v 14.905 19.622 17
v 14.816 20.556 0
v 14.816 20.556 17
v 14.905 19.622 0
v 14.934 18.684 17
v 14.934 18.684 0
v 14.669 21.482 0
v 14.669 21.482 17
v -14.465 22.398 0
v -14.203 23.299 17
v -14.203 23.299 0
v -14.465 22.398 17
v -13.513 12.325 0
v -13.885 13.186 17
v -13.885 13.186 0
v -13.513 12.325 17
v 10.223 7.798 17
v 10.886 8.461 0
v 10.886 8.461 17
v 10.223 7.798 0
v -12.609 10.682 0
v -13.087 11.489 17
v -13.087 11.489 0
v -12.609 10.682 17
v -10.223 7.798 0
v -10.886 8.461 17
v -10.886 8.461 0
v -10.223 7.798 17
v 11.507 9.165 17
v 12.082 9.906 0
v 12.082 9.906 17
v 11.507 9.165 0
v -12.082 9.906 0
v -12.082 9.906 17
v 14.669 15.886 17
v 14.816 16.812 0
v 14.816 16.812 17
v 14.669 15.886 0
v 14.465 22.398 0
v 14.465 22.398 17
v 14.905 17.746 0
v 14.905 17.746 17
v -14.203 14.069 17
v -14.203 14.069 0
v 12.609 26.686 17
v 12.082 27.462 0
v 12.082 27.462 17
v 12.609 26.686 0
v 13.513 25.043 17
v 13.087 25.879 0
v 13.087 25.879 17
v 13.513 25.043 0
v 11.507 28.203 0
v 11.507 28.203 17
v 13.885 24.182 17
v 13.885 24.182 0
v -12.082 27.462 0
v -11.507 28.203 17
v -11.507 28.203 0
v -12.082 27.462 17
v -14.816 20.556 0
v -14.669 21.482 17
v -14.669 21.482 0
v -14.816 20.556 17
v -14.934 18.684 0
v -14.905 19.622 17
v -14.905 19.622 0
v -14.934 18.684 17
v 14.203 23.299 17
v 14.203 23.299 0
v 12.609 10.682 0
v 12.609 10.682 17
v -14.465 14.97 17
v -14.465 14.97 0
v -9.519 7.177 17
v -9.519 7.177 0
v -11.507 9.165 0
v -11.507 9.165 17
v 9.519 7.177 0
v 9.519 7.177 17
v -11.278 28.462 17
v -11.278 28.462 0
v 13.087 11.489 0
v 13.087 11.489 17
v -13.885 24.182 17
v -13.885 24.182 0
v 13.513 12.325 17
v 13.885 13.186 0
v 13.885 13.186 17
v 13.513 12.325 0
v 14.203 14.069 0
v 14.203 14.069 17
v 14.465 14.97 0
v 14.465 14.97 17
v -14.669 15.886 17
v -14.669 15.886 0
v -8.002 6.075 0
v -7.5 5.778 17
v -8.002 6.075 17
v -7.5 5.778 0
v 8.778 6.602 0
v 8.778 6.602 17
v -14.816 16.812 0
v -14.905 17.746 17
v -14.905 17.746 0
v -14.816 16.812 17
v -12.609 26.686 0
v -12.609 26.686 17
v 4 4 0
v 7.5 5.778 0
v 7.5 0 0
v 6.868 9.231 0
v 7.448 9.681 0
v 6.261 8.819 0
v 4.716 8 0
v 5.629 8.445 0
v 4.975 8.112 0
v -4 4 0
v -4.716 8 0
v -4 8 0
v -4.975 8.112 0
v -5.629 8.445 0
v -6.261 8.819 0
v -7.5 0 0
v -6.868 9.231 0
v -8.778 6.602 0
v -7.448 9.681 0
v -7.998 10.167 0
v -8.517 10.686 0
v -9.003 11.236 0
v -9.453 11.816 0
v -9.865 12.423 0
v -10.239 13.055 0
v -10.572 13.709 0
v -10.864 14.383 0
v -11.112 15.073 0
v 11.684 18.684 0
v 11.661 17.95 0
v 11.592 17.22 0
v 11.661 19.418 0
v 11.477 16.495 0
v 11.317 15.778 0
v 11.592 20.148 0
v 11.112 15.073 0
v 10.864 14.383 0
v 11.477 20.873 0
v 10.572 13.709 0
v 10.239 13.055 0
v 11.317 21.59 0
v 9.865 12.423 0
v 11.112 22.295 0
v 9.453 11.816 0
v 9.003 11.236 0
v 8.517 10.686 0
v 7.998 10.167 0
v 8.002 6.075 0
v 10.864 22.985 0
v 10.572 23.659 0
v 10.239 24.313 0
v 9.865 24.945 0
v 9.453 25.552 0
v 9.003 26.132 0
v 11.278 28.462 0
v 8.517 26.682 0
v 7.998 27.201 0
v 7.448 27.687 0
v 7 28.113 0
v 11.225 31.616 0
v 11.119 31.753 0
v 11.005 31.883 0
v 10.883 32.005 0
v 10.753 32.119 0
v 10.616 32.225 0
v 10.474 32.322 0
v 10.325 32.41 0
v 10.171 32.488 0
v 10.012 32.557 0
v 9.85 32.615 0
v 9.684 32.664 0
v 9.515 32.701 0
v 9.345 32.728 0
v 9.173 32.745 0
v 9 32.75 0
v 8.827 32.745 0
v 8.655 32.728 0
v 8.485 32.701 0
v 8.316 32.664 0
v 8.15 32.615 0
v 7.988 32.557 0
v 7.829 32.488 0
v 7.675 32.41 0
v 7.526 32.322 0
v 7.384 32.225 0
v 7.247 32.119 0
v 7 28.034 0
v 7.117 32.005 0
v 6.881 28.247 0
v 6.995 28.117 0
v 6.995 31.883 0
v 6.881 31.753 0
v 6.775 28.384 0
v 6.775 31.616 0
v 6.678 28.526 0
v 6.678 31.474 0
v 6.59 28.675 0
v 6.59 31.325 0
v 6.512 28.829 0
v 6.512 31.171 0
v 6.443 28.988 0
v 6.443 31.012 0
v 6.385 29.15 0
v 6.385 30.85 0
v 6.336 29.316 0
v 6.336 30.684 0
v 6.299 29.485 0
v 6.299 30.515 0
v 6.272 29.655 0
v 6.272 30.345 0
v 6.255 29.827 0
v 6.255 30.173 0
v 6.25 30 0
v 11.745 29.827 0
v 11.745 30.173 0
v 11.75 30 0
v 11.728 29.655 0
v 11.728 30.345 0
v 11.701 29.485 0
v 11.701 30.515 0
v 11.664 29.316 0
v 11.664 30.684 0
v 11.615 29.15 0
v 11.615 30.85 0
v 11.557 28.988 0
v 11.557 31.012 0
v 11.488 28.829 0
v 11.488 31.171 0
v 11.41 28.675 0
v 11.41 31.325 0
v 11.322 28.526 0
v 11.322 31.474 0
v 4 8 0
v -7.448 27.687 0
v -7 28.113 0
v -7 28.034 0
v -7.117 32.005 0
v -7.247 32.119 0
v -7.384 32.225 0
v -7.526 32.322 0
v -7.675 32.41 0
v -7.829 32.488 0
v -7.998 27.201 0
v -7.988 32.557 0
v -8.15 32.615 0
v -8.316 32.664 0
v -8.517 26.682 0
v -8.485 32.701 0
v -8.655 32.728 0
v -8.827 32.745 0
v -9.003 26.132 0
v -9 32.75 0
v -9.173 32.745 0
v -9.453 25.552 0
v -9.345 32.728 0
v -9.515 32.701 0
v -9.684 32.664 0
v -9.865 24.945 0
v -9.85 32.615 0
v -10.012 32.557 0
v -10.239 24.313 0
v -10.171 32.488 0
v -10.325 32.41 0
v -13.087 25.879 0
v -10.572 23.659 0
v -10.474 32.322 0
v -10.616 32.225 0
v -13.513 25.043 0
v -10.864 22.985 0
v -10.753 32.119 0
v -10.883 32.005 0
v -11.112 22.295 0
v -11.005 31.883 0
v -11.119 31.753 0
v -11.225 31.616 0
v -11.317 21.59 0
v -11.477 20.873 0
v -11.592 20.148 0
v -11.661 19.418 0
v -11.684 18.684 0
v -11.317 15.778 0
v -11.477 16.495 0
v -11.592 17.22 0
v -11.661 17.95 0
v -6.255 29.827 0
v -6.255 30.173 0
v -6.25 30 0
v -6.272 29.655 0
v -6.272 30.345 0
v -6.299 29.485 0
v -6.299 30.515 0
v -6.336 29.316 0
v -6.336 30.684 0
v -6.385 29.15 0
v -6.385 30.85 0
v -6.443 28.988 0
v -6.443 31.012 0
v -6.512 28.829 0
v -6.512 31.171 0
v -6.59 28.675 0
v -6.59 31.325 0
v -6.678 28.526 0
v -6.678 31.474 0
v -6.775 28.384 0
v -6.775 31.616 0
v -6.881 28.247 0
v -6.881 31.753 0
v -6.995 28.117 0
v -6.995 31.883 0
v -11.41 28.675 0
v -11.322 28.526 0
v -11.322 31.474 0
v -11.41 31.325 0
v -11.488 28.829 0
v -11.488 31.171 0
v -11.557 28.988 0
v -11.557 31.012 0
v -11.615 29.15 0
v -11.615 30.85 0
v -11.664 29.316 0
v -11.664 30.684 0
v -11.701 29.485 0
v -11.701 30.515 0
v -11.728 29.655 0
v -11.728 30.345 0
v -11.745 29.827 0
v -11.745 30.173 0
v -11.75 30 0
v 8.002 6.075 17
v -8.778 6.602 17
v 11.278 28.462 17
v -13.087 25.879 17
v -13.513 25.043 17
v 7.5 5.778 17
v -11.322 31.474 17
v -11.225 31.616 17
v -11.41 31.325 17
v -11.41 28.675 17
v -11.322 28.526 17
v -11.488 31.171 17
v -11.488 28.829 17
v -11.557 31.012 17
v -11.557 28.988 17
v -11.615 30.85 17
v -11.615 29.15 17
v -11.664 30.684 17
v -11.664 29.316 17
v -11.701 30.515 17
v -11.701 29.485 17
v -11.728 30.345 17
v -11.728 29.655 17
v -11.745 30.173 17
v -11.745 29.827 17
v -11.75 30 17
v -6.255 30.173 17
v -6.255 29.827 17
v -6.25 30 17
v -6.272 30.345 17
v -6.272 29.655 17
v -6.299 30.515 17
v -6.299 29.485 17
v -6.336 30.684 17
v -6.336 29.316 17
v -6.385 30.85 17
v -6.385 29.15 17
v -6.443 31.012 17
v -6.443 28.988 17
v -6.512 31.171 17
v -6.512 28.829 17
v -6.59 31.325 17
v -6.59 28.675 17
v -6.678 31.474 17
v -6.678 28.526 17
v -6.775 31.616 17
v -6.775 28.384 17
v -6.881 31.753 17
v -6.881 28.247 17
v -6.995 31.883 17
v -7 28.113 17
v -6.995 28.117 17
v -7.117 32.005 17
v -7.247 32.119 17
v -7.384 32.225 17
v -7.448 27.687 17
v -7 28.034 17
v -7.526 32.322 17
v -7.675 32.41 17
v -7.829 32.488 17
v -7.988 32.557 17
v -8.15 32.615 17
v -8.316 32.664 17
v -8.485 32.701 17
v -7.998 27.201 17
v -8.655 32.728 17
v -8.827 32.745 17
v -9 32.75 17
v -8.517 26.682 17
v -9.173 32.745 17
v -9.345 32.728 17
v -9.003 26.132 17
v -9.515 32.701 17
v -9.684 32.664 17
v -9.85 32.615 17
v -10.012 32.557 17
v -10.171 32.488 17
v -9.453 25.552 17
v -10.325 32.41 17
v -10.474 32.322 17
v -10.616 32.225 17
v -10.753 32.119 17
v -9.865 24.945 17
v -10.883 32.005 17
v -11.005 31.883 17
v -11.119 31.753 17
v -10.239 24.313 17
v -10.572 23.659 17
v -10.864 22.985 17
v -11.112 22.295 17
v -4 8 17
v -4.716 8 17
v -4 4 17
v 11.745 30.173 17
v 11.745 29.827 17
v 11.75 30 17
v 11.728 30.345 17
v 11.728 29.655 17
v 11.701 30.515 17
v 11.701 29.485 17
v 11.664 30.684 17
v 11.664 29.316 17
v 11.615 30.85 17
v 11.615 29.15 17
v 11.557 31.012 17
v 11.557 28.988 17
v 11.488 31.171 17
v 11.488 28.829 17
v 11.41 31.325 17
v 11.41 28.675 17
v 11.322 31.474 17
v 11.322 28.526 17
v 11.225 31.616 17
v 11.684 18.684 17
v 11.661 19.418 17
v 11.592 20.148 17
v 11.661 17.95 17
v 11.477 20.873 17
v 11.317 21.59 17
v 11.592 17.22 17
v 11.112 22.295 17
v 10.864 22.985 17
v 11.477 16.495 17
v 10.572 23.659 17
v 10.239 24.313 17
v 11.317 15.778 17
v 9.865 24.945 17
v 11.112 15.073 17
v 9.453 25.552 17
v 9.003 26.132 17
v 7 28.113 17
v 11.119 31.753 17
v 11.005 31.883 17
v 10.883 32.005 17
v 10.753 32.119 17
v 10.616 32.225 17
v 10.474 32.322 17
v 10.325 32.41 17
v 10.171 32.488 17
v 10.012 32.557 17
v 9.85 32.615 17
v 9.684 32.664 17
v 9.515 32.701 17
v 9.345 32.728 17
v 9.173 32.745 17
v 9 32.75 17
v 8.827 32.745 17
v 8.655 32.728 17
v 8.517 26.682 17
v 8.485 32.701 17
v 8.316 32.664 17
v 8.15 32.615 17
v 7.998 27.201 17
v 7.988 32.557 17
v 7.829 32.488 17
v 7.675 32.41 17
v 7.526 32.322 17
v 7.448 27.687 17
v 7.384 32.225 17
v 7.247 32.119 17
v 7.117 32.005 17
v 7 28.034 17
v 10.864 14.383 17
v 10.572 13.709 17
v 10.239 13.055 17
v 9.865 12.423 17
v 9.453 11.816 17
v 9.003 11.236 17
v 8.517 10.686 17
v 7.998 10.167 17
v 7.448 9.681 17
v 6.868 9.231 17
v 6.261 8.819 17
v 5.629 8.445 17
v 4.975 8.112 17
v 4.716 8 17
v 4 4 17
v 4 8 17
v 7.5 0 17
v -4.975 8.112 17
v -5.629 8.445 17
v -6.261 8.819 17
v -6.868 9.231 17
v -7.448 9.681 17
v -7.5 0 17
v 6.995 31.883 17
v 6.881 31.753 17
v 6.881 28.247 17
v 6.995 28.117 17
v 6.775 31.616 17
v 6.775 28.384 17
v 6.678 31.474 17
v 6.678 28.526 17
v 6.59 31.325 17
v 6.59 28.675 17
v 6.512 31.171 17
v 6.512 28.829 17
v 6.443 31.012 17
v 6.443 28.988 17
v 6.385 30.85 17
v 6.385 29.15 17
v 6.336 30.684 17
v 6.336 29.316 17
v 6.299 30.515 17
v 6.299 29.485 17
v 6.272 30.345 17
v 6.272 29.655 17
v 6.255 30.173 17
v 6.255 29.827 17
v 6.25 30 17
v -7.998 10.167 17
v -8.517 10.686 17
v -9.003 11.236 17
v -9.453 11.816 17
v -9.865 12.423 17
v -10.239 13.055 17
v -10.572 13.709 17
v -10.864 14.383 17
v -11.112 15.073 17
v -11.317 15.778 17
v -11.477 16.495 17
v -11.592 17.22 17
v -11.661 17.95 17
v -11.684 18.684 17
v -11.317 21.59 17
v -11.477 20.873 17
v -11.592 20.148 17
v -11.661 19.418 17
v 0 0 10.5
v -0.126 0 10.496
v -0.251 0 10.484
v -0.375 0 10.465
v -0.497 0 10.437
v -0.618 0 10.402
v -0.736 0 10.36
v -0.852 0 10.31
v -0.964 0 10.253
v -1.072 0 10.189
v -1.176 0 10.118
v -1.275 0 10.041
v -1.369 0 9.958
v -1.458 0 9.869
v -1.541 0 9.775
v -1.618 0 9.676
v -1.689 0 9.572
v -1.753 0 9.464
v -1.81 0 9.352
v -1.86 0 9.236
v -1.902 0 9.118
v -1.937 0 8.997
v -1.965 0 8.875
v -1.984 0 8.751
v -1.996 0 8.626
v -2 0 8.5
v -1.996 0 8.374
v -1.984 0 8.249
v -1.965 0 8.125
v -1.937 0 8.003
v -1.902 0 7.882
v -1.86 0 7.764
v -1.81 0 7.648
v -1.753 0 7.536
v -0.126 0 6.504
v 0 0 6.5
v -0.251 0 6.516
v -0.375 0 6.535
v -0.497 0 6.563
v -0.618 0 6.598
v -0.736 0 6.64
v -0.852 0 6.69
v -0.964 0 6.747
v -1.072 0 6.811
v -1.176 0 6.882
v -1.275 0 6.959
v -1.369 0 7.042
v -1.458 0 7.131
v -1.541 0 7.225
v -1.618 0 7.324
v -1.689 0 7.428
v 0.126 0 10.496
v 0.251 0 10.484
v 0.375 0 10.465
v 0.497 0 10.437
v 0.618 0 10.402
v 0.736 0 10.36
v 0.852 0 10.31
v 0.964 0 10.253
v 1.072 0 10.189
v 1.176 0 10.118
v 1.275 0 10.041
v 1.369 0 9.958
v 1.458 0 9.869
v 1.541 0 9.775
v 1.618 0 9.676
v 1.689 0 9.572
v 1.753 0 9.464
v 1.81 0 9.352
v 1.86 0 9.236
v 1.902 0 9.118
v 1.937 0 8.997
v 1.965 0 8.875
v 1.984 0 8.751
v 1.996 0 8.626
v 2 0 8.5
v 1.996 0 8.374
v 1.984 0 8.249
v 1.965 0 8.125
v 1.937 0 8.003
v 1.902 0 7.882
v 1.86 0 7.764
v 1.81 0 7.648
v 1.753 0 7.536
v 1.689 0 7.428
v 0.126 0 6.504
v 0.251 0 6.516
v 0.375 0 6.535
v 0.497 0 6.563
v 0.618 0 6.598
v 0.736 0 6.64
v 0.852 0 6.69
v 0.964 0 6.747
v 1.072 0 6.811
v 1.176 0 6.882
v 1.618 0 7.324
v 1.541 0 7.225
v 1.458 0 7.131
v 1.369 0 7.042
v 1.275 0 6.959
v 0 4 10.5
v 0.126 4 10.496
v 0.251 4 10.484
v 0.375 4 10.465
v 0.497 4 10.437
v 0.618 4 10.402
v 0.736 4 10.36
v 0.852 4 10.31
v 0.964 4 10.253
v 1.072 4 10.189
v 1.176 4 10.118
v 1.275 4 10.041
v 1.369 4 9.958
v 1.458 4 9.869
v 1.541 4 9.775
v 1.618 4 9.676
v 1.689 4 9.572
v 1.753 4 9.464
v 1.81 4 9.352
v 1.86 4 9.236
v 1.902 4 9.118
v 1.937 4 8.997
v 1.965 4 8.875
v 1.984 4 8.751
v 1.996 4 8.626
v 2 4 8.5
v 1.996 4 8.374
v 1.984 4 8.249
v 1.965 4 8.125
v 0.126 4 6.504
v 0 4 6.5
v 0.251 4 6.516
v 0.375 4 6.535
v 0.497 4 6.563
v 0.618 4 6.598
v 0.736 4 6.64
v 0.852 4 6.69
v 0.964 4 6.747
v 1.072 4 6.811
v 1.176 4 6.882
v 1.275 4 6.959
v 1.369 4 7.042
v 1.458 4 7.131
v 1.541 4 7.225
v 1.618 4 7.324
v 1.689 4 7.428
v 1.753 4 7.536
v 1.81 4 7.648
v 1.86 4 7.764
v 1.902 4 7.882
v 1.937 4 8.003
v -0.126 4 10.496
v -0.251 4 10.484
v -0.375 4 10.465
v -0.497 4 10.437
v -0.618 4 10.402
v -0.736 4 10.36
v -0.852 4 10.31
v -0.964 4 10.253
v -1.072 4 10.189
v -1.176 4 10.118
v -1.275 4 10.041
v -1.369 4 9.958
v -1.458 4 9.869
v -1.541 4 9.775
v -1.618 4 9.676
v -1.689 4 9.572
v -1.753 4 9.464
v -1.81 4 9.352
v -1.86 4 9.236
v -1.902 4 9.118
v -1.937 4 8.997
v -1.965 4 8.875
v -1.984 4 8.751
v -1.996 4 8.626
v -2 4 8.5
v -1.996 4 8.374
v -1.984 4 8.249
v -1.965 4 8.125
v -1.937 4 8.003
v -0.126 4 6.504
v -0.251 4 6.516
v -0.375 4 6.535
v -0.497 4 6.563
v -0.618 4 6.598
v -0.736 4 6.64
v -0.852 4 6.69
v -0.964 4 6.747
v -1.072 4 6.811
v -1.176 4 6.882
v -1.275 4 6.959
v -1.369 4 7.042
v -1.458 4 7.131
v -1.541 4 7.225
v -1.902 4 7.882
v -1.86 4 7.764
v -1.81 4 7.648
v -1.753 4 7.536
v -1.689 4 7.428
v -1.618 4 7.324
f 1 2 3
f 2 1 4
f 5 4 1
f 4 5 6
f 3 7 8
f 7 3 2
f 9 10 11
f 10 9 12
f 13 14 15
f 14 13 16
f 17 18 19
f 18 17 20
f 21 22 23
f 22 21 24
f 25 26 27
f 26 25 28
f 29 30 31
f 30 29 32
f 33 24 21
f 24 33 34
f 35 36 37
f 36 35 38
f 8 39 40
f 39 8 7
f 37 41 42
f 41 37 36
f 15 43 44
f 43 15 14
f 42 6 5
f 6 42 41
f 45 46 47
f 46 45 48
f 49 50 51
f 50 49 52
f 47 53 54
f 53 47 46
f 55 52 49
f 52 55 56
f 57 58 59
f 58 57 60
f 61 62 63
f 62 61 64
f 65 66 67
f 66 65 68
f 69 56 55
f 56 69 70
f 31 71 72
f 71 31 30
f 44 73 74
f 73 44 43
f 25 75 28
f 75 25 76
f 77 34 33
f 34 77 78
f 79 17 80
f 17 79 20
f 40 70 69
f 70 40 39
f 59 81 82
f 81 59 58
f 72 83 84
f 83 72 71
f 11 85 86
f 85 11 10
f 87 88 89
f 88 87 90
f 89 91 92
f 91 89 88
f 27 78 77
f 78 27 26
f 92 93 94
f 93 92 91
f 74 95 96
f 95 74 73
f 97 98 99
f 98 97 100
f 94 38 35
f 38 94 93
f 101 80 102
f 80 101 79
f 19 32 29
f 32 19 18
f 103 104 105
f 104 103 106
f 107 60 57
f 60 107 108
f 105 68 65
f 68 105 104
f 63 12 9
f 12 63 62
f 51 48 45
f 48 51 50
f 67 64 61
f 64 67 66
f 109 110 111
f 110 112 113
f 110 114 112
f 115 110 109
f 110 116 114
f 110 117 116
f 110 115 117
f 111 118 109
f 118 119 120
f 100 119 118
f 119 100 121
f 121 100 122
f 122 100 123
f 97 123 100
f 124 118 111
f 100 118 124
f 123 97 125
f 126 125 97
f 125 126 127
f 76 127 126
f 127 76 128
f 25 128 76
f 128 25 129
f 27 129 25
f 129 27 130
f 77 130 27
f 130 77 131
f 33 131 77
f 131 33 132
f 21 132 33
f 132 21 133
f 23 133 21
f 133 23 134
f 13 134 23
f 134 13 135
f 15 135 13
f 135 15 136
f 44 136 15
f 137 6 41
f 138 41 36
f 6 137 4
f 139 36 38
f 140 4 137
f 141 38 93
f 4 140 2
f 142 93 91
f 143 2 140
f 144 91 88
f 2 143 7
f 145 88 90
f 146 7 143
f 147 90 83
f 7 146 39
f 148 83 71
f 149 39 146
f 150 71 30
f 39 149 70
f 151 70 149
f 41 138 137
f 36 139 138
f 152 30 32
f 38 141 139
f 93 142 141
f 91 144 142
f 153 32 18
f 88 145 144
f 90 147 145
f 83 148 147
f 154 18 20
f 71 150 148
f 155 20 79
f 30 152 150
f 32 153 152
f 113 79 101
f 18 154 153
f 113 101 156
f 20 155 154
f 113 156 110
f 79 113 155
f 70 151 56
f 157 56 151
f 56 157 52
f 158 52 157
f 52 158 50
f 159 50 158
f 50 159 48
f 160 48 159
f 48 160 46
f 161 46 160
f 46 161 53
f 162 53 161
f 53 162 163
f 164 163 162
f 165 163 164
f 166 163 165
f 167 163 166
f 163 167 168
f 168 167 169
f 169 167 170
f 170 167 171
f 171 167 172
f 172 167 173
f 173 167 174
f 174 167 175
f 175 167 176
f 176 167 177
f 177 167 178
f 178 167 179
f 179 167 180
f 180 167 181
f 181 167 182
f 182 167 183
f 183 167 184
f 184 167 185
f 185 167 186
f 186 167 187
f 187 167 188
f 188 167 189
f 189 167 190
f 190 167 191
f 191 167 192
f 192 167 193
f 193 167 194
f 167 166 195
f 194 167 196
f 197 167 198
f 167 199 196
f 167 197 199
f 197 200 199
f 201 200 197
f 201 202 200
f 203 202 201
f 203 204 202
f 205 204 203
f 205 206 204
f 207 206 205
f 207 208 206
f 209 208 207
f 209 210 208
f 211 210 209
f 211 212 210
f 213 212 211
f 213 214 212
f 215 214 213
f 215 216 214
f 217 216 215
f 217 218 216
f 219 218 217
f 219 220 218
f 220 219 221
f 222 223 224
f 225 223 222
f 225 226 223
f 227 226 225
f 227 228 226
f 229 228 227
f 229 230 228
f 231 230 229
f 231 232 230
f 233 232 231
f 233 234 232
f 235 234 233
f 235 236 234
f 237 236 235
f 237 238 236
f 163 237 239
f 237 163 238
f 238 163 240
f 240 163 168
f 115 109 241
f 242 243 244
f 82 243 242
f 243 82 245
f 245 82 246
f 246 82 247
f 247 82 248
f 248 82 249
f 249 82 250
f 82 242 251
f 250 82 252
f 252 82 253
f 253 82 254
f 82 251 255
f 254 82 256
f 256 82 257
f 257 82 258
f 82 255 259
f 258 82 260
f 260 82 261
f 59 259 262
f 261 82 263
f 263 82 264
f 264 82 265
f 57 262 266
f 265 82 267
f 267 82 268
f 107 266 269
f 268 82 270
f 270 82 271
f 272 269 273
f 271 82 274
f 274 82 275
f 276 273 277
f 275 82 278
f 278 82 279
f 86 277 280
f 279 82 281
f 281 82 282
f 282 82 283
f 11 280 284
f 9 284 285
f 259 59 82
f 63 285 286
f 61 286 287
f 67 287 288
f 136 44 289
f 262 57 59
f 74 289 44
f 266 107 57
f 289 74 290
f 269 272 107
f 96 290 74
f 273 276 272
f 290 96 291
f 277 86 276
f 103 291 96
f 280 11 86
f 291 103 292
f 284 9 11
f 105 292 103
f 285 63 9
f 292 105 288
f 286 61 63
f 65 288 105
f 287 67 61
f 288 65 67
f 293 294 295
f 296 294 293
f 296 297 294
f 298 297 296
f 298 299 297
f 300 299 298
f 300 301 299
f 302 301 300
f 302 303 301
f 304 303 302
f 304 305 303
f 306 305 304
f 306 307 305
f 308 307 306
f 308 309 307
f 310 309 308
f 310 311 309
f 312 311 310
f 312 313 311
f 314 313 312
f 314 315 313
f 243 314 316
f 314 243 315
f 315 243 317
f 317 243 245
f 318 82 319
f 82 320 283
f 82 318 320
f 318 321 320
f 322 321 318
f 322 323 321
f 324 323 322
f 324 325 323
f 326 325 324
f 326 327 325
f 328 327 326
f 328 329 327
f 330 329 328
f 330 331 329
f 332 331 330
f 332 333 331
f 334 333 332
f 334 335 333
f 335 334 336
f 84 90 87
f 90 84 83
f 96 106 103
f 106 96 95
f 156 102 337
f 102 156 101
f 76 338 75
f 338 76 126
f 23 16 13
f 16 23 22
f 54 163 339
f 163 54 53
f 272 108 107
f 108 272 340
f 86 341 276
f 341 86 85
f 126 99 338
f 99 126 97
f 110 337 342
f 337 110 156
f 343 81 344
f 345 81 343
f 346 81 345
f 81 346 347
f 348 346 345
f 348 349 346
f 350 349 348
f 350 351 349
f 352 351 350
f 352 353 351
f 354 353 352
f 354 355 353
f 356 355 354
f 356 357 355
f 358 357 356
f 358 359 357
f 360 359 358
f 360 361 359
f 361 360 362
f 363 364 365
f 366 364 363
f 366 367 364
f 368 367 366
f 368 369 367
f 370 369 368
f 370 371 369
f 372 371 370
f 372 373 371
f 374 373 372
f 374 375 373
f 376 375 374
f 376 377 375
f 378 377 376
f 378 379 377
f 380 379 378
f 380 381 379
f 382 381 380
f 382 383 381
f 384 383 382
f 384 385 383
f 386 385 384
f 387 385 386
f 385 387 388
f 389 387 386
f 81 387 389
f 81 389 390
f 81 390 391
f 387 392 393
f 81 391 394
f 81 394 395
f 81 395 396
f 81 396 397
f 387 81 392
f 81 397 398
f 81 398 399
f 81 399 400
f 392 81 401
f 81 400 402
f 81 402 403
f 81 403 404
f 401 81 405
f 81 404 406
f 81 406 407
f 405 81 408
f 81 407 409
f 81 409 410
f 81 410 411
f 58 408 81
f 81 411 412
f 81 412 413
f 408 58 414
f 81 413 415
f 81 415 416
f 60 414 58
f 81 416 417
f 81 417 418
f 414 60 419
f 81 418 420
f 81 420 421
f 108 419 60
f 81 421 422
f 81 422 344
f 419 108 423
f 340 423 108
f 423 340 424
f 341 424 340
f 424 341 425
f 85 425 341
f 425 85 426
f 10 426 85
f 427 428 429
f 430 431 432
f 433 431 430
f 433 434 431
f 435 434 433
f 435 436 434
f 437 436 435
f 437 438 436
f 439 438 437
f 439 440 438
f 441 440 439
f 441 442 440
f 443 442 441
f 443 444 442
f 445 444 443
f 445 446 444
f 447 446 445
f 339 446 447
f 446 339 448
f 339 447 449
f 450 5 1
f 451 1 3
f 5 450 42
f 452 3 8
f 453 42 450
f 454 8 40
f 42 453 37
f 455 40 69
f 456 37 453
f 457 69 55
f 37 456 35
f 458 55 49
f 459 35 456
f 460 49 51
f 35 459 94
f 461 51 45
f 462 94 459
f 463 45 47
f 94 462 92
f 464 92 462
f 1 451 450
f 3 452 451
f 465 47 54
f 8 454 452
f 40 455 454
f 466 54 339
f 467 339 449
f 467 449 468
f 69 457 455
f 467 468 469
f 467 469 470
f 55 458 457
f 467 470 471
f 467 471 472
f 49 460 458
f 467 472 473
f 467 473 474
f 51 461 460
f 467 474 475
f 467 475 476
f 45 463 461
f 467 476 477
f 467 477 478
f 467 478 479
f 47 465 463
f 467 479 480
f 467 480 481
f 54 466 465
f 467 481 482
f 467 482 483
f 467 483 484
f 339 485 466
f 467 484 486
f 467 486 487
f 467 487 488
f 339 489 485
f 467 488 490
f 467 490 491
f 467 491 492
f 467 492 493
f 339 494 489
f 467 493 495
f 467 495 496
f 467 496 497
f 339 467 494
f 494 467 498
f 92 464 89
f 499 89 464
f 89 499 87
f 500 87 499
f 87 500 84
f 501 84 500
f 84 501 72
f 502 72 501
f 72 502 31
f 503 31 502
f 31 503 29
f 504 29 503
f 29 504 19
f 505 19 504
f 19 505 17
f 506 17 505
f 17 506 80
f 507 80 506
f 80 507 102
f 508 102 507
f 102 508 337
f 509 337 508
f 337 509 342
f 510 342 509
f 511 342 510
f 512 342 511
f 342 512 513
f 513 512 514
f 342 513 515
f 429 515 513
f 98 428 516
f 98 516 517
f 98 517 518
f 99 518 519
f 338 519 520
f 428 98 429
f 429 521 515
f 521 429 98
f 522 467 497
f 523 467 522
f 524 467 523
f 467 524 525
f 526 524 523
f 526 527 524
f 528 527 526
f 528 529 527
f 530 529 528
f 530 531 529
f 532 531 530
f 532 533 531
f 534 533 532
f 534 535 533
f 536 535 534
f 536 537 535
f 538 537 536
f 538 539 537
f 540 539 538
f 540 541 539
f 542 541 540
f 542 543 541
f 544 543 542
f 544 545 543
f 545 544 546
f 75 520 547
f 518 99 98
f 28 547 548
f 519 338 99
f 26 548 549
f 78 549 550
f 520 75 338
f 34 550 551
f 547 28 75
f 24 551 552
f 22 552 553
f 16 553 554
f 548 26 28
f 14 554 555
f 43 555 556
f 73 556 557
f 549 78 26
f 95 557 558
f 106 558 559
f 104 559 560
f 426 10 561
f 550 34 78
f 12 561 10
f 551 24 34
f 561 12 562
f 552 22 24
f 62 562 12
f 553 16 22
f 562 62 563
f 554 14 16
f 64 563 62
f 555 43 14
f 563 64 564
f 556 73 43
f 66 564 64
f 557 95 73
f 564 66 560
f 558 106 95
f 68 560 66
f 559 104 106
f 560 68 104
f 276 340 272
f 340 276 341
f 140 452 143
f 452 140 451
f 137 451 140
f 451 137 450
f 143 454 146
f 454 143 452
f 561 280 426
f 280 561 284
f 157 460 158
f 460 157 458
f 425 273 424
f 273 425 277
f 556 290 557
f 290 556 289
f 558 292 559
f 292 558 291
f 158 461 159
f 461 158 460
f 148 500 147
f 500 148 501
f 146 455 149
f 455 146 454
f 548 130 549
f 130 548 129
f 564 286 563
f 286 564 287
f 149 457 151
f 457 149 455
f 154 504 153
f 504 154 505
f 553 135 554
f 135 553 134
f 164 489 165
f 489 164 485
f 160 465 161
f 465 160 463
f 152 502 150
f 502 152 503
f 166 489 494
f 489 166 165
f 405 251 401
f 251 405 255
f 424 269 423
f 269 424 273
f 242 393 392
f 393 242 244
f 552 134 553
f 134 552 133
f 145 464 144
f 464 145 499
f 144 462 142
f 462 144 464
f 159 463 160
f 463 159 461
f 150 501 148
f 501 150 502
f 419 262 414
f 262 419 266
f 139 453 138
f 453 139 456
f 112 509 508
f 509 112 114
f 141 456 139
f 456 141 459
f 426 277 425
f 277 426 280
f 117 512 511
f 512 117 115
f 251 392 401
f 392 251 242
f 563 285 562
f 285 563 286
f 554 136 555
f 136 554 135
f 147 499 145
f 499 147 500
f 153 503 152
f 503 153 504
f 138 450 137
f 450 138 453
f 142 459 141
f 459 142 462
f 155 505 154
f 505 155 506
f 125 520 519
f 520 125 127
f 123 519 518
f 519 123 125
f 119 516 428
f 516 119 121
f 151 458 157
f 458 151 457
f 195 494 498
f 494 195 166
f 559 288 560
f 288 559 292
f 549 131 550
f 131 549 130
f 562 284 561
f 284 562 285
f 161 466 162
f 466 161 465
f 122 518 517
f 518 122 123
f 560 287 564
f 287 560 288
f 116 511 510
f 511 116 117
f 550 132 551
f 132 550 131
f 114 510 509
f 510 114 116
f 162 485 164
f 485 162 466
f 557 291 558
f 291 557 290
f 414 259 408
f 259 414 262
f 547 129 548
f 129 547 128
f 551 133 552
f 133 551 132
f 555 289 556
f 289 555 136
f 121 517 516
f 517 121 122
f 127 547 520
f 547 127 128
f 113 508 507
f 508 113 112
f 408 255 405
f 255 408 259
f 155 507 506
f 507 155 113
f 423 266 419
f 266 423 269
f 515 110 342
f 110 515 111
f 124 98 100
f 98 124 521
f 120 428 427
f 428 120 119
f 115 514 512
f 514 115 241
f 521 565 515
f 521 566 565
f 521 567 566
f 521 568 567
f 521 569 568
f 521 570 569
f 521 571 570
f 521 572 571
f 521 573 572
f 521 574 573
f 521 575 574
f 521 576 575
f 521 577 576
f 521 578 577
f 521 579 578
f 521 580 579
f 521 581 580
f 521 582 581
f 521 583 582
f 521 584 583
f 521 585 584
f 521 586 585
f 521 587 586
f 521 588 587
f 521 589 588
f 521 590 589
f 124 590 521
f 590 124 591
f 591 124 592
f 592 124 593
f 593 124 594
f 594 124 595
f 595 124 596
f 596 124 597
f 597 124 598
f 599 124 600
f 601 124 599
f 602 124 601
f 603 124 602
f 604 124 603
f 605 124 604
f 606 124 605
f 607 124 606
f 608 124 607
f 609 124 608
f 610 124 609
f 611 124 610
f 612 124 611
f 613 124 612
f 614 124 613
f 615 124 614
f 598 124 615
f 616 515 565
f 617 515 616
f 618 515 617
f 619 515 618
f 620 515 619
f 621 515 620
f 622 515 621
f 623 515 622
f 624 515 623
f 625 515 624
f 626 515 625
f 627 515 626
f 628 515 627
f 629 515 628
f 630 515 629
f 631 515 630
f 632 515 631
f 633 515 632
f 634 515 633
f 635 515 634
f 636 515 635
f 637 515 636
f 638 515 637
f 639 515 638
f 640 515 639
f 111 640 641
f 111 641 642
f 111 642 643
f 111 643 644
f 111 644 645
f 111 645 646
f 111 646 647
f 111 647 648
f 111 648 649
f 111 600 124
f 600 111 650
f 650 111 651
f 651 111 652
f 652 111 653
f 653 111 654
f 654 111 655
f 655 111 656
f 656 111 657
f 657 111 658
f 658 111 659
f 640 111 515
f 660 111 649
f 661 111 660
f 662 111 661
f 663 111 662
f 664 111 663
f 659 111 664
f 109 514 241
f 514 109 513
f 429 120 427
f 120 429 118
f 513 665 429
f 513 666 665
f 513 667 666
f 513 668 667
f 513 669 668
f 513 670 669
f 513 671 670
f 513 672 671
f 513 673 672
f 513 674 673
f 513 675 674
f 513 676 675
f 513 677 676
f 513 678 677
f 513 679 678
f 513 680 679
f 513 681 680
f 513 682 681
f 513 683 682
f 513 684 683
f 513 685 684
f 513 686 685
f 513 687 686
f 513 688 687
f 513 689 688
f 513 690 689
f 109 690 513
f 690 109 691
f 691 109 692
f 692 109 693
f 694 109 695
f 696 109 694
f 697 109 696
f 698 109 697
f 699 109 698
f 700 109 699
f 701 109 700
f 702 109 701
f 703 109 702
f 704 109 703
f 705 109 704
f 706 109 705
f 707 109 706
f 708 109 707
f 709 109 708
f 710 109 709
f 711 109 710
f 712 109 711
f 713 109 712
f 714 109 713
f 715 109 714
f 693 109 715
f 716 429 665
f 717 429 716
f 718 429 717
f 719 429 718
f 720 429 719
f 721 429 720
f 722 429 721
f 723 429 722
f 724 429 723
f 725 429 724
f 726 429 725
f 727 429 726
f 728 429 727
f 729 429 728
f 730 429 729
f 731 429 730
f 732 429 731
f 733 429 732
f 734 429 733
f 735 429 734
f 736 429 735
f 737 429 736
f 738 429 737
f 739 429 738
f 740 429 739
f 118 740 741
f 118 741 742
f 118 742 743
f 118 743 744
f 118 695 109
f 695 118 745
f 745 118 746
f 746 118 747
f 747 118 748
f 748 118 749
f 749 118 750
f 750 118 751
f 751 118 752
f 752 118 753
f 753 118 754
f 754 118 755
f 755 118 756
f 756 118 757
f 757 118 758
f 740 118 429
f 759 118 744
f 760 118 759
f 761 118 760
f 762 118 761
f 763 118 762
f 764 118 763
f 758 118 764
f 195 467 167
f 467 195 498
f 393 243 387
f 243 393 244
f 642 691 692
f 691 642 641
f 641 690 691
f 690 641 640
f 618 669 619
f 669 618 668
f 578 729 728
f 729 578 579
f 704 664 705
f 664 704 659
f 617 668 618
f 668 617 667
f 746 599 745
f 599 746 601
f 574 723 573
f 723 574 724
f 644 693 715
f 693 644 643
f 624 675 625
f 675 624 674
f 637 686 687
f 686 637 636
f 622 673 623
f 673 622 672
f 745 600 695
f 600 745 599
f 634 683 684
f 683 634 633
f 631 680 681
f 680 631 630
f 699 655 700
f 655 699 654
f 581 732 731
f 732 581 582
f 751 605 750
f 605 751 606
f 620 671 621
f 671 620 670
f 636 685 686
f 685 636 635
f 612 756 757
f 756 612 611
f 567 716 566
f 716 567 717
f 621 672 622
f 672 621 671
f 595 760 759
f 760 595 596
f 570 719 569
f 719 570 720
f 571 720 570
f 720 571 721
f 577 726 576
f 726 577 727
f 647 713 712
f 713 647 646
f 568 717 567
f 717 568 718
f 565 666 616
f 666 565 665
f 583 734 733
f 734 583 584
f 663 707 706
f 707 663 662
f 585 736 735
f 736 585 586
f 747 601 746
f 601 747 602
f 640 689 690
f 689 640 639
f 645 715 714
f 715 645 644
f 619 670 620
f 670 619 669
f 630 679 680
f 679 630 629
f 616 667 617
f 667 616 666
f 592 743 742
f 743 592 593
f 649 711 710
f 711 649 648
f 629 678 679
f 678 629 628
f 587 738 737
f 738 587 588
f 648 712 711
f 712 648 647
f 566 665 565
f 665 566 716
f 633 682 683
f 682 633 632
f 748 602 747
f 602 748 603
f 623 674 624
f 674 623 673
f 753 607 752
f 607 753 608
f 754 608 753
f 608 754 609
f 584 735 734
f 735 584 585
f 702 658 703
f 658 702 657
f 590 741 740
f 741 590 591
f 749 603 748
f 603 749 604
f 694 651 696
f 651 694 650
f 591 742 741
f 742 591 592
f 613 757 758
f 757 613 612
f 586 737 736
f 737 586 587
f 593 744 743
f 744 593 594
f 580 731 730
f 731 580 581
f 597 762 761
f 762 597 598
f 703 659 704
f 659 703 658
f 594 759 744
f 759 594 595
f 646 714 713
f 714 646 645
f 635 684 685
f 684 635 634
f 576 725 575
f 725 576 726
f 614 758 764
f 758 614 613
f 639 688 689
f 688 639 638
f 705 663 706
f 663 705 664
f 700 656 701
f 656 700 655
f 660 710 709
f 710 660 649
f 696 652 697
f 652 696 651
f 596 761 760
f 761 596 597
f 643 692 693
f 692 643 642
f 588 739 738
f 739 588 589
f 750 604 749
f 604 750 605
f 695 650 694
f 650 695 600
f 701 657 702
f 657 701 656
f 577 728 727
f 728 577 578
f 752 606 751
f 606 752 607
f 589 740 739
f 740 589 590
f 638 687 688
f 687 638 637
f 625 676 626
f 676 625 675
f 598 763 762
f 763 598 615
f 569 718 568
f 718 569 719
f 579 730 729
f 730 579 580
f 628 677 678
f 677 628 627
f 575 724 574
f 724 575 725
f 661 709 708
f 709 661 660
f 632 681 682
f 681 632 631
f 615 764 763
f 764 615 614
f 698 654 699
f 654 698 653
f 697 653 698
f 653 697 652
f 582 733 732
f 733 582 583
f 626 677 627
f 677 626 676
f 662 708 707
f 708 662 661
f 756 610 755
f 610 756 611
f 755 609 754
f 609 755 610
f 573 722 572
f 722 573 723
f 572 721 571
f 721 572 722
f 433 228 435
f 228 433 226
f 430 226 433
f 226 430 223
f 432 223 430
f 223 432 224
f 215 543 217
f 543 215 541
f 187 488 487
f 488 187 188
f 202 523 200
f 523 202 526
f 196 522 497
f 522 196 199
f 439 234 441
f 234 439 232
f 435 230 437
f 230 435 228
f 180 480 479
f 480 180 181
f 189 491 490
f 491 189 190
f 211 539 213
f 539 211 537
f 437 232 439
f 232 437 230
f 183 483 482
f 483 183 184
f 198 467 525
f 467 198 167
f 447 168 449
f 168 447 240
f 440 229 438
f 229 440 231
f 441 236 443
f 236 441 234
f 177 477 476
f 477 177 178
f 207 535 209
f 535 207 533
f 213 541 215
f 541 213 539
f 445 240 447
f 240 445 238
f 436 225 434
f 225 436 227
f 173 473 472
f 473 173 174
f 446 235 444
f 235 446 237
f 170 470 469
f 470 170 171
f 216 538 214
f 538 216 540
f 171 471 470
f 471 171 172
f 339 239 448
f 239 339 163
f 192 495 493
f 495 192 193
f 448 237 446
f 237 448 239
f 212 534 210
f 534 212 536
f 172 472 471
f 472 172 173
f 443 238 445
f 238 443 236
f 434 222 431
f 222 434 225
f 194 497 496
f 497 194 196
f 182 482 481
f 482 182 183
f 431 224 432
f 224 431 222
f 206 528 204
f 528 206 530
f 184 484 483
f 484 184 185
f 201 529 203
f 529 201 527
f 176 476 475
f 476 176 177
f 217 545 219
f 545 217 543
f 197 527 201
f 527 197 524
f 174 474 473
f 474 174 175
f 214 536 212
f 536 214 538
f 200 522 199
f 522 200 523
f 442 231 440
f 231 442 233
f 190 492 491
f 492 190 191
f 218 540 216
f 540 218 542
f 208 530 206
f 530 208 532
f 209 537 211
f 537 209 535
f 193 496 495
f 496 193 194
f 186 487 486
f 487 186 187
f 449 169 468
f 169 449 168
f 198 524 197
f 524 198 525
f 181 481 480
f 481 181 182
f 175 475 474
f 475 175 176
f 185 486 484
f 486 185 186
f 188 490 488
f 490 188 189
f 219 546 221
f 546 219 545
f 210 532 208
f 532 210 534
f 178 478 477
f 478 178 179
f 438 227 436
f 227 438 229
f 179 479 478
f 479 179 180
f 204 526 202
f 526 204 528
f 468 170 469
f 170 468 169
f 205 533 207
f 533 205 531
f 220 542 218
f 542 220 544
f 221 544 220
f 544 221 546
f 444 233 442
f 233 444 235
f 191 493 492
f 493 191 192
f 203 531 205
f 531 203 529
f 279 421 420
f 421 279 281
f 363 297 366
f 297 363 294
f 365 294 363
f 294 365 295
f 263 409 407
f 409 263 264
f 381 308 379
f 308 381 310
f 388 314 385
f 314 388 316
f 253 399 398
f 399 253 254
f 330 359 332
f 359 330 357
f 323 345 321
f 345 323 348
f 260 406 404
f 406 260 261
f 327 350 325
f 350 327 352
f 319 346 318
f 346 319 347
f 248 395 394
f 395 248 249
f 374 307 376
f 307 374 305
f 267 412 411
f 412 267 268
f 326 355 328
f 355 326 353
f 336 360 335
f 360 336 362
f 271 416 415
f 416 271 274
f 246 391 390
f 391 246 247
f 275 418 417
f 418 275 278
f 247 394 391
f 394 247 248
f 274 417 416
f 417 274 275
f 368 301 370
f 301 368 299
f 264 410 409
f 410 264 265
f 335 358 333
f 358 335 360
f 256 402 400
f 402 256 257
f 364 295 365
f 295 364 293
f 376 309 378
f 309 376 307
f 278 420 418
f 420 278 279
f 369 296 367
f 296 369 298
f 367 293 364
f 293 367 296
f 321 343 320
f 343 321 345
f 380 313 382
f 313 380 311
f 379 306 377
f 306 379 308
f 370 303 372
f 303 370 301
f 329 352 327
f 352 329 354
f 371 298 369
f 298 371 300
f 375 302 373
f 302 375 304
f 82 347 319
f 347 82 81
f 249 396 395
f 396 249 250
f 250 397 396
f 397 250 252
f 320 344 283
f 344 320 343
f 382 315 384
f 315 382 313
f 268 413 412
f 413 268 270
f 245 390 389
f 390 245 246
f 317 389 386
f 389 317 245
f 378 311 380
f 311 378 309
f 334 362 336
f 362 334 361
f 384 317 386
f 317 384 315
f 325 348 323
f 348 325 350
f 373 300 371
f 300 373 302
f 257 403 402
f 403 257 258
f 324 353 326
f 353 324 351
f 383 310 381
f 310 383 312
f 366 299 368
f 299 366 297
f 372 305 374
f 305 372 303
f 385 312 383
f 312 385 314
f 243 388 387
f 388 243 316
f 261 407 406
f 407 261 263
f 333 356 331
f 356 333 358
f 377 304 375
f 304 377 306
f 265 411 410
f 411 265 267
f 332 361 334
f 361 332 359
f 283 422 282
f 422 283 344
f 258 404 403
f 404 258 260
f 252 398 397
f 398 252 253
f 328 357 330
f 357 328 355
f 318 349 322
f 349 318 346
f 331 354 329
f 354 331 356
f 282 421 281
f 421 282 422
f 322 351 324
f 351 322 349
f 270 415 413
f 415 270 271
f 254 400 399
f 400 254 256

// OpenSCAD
// file: ../shapes.scad
FACES   = 180;
EPSILON = 0.1;
PIN	    = 2.54;


module tube(h=1, inner=0, outer=0, di=0, do=0) {
    rInner = inner > 0 ? inner : di / 2;
    rOuter = outer > 0 ? outer : do / 2;

	if (rInner >= rOuter) echo("ERROR in tube. rOuter must be > rInner.");

	difference() {
		cylinder(h=h, r=rOuter);
		translate([0,0,-EPSILON]) {
			cylinder(h=h + EPSILON*2, r=rInner);
		}
	}
}

module roundedRect(h, d)
{
	D0 = d * 0.8;
	D1 = d * 0.2;
	H = h;

	hull()
	{
		translate([-D0/2, -D0/2, 0]) {
			cube([D0, D0, H]);
		}
		translate([-D0/2, -D0/2, 0])  cylinder(d=D1, h=H);
		translate([ D0/2, -D0/2, 0])  cylinder(d=D1, h=H);
		translate([-D0/2,  D0/2, 0])  cylinder(d=D1, h=H);
		translate([ D0/2,  D0/2, 0])  cylinder(d=D1, h=H);
	}
}

module cubePair(x, size)
{
	translate([x, 0, 0])
		cube(size=size);
	mirror([1,0,0]) translate([x, 0, 0])
		cube(size=size);
}

module polygonXY(h, points)
{
    linear_extrude(height = h) {
        polygon(points=points);
    }  
}

module polygonYZ(h, points)
{
    multmatrix(m = [ [0, 0, 1, 0],
    				 [1, 0, 0, 0],
    				 [0, 1, 0, 0],
    				 [0, 0, 0, 1]
       			   ])
    linear_extrude(height = h) {
        polygon(points=points);
    }  	
}

module polygonXZ(h, points)
{
    multmatrix(m = [ [1, 0, 0, 0],
    				 [0, 0, 1, 0],
    				 [0, 1, 0, 0],
    				 [0, 0, 0, 1]
       			   ])
    linear_extrude(height = h) {
        polygon(points=points);
    }  	
}


////////////////
// DEPRECATED //
////////////////

module shelf(_r0, _h, _r1) {
	rotate_extrude($fn=FACES) {
		polygon([[_r0, 0], [_r1, _h], [_r0, _h]]);
	}
}


module pinsAtTube(r, h, nX, nY, longY)
{
	OFFSET = sqrt(r * r - PIN * PIN * nX * nX / 4);

	Y = longY ? 40 : PIN * nY;

    translate([-nX * PIN / 2, OFFSET - PIN * nY, 0]) {
        cube([nX * PIN, Y, h]);
    }	
}
// main file
use <../shapes.scad>
$fn = 100;

D_INNER = 25.4 * 0.92;
D_OUTER = D_INNER + 6.5;
DZ = 17;
BASE_X = 15;
BASE_Y = 8;
H_CUT = 14;

// base
difference()
{ 
    union() {
        translate([-BASE_X/2, 0, 0])
            cube(size=[BASE_X, BASE_Y, DZ]); 
        translate([0, 7 + D_INNER/2]) 
            tube(h=DZ, do=D_OUTER, di=D_INNER);        
    }
    CUT_X = 8;
    translate([-CUT_X/2, 4, 0])
        cube(size=[CUT_X, 10, DZ]);
    translate([-H_CUT/2, 10, -1])
        cube(size=[H_CUT, 50, 20]);

    translate([0, 0, DZ/2]) rotate([-90, 0, 0])
        cylinder(h=10, d=4);
}

translate([ 9, 30, 0])
    cylinder(h=DZ, d=5.5);
translate([-9, 30, 0])
    cylinder(h=DZ, d=5.5);
